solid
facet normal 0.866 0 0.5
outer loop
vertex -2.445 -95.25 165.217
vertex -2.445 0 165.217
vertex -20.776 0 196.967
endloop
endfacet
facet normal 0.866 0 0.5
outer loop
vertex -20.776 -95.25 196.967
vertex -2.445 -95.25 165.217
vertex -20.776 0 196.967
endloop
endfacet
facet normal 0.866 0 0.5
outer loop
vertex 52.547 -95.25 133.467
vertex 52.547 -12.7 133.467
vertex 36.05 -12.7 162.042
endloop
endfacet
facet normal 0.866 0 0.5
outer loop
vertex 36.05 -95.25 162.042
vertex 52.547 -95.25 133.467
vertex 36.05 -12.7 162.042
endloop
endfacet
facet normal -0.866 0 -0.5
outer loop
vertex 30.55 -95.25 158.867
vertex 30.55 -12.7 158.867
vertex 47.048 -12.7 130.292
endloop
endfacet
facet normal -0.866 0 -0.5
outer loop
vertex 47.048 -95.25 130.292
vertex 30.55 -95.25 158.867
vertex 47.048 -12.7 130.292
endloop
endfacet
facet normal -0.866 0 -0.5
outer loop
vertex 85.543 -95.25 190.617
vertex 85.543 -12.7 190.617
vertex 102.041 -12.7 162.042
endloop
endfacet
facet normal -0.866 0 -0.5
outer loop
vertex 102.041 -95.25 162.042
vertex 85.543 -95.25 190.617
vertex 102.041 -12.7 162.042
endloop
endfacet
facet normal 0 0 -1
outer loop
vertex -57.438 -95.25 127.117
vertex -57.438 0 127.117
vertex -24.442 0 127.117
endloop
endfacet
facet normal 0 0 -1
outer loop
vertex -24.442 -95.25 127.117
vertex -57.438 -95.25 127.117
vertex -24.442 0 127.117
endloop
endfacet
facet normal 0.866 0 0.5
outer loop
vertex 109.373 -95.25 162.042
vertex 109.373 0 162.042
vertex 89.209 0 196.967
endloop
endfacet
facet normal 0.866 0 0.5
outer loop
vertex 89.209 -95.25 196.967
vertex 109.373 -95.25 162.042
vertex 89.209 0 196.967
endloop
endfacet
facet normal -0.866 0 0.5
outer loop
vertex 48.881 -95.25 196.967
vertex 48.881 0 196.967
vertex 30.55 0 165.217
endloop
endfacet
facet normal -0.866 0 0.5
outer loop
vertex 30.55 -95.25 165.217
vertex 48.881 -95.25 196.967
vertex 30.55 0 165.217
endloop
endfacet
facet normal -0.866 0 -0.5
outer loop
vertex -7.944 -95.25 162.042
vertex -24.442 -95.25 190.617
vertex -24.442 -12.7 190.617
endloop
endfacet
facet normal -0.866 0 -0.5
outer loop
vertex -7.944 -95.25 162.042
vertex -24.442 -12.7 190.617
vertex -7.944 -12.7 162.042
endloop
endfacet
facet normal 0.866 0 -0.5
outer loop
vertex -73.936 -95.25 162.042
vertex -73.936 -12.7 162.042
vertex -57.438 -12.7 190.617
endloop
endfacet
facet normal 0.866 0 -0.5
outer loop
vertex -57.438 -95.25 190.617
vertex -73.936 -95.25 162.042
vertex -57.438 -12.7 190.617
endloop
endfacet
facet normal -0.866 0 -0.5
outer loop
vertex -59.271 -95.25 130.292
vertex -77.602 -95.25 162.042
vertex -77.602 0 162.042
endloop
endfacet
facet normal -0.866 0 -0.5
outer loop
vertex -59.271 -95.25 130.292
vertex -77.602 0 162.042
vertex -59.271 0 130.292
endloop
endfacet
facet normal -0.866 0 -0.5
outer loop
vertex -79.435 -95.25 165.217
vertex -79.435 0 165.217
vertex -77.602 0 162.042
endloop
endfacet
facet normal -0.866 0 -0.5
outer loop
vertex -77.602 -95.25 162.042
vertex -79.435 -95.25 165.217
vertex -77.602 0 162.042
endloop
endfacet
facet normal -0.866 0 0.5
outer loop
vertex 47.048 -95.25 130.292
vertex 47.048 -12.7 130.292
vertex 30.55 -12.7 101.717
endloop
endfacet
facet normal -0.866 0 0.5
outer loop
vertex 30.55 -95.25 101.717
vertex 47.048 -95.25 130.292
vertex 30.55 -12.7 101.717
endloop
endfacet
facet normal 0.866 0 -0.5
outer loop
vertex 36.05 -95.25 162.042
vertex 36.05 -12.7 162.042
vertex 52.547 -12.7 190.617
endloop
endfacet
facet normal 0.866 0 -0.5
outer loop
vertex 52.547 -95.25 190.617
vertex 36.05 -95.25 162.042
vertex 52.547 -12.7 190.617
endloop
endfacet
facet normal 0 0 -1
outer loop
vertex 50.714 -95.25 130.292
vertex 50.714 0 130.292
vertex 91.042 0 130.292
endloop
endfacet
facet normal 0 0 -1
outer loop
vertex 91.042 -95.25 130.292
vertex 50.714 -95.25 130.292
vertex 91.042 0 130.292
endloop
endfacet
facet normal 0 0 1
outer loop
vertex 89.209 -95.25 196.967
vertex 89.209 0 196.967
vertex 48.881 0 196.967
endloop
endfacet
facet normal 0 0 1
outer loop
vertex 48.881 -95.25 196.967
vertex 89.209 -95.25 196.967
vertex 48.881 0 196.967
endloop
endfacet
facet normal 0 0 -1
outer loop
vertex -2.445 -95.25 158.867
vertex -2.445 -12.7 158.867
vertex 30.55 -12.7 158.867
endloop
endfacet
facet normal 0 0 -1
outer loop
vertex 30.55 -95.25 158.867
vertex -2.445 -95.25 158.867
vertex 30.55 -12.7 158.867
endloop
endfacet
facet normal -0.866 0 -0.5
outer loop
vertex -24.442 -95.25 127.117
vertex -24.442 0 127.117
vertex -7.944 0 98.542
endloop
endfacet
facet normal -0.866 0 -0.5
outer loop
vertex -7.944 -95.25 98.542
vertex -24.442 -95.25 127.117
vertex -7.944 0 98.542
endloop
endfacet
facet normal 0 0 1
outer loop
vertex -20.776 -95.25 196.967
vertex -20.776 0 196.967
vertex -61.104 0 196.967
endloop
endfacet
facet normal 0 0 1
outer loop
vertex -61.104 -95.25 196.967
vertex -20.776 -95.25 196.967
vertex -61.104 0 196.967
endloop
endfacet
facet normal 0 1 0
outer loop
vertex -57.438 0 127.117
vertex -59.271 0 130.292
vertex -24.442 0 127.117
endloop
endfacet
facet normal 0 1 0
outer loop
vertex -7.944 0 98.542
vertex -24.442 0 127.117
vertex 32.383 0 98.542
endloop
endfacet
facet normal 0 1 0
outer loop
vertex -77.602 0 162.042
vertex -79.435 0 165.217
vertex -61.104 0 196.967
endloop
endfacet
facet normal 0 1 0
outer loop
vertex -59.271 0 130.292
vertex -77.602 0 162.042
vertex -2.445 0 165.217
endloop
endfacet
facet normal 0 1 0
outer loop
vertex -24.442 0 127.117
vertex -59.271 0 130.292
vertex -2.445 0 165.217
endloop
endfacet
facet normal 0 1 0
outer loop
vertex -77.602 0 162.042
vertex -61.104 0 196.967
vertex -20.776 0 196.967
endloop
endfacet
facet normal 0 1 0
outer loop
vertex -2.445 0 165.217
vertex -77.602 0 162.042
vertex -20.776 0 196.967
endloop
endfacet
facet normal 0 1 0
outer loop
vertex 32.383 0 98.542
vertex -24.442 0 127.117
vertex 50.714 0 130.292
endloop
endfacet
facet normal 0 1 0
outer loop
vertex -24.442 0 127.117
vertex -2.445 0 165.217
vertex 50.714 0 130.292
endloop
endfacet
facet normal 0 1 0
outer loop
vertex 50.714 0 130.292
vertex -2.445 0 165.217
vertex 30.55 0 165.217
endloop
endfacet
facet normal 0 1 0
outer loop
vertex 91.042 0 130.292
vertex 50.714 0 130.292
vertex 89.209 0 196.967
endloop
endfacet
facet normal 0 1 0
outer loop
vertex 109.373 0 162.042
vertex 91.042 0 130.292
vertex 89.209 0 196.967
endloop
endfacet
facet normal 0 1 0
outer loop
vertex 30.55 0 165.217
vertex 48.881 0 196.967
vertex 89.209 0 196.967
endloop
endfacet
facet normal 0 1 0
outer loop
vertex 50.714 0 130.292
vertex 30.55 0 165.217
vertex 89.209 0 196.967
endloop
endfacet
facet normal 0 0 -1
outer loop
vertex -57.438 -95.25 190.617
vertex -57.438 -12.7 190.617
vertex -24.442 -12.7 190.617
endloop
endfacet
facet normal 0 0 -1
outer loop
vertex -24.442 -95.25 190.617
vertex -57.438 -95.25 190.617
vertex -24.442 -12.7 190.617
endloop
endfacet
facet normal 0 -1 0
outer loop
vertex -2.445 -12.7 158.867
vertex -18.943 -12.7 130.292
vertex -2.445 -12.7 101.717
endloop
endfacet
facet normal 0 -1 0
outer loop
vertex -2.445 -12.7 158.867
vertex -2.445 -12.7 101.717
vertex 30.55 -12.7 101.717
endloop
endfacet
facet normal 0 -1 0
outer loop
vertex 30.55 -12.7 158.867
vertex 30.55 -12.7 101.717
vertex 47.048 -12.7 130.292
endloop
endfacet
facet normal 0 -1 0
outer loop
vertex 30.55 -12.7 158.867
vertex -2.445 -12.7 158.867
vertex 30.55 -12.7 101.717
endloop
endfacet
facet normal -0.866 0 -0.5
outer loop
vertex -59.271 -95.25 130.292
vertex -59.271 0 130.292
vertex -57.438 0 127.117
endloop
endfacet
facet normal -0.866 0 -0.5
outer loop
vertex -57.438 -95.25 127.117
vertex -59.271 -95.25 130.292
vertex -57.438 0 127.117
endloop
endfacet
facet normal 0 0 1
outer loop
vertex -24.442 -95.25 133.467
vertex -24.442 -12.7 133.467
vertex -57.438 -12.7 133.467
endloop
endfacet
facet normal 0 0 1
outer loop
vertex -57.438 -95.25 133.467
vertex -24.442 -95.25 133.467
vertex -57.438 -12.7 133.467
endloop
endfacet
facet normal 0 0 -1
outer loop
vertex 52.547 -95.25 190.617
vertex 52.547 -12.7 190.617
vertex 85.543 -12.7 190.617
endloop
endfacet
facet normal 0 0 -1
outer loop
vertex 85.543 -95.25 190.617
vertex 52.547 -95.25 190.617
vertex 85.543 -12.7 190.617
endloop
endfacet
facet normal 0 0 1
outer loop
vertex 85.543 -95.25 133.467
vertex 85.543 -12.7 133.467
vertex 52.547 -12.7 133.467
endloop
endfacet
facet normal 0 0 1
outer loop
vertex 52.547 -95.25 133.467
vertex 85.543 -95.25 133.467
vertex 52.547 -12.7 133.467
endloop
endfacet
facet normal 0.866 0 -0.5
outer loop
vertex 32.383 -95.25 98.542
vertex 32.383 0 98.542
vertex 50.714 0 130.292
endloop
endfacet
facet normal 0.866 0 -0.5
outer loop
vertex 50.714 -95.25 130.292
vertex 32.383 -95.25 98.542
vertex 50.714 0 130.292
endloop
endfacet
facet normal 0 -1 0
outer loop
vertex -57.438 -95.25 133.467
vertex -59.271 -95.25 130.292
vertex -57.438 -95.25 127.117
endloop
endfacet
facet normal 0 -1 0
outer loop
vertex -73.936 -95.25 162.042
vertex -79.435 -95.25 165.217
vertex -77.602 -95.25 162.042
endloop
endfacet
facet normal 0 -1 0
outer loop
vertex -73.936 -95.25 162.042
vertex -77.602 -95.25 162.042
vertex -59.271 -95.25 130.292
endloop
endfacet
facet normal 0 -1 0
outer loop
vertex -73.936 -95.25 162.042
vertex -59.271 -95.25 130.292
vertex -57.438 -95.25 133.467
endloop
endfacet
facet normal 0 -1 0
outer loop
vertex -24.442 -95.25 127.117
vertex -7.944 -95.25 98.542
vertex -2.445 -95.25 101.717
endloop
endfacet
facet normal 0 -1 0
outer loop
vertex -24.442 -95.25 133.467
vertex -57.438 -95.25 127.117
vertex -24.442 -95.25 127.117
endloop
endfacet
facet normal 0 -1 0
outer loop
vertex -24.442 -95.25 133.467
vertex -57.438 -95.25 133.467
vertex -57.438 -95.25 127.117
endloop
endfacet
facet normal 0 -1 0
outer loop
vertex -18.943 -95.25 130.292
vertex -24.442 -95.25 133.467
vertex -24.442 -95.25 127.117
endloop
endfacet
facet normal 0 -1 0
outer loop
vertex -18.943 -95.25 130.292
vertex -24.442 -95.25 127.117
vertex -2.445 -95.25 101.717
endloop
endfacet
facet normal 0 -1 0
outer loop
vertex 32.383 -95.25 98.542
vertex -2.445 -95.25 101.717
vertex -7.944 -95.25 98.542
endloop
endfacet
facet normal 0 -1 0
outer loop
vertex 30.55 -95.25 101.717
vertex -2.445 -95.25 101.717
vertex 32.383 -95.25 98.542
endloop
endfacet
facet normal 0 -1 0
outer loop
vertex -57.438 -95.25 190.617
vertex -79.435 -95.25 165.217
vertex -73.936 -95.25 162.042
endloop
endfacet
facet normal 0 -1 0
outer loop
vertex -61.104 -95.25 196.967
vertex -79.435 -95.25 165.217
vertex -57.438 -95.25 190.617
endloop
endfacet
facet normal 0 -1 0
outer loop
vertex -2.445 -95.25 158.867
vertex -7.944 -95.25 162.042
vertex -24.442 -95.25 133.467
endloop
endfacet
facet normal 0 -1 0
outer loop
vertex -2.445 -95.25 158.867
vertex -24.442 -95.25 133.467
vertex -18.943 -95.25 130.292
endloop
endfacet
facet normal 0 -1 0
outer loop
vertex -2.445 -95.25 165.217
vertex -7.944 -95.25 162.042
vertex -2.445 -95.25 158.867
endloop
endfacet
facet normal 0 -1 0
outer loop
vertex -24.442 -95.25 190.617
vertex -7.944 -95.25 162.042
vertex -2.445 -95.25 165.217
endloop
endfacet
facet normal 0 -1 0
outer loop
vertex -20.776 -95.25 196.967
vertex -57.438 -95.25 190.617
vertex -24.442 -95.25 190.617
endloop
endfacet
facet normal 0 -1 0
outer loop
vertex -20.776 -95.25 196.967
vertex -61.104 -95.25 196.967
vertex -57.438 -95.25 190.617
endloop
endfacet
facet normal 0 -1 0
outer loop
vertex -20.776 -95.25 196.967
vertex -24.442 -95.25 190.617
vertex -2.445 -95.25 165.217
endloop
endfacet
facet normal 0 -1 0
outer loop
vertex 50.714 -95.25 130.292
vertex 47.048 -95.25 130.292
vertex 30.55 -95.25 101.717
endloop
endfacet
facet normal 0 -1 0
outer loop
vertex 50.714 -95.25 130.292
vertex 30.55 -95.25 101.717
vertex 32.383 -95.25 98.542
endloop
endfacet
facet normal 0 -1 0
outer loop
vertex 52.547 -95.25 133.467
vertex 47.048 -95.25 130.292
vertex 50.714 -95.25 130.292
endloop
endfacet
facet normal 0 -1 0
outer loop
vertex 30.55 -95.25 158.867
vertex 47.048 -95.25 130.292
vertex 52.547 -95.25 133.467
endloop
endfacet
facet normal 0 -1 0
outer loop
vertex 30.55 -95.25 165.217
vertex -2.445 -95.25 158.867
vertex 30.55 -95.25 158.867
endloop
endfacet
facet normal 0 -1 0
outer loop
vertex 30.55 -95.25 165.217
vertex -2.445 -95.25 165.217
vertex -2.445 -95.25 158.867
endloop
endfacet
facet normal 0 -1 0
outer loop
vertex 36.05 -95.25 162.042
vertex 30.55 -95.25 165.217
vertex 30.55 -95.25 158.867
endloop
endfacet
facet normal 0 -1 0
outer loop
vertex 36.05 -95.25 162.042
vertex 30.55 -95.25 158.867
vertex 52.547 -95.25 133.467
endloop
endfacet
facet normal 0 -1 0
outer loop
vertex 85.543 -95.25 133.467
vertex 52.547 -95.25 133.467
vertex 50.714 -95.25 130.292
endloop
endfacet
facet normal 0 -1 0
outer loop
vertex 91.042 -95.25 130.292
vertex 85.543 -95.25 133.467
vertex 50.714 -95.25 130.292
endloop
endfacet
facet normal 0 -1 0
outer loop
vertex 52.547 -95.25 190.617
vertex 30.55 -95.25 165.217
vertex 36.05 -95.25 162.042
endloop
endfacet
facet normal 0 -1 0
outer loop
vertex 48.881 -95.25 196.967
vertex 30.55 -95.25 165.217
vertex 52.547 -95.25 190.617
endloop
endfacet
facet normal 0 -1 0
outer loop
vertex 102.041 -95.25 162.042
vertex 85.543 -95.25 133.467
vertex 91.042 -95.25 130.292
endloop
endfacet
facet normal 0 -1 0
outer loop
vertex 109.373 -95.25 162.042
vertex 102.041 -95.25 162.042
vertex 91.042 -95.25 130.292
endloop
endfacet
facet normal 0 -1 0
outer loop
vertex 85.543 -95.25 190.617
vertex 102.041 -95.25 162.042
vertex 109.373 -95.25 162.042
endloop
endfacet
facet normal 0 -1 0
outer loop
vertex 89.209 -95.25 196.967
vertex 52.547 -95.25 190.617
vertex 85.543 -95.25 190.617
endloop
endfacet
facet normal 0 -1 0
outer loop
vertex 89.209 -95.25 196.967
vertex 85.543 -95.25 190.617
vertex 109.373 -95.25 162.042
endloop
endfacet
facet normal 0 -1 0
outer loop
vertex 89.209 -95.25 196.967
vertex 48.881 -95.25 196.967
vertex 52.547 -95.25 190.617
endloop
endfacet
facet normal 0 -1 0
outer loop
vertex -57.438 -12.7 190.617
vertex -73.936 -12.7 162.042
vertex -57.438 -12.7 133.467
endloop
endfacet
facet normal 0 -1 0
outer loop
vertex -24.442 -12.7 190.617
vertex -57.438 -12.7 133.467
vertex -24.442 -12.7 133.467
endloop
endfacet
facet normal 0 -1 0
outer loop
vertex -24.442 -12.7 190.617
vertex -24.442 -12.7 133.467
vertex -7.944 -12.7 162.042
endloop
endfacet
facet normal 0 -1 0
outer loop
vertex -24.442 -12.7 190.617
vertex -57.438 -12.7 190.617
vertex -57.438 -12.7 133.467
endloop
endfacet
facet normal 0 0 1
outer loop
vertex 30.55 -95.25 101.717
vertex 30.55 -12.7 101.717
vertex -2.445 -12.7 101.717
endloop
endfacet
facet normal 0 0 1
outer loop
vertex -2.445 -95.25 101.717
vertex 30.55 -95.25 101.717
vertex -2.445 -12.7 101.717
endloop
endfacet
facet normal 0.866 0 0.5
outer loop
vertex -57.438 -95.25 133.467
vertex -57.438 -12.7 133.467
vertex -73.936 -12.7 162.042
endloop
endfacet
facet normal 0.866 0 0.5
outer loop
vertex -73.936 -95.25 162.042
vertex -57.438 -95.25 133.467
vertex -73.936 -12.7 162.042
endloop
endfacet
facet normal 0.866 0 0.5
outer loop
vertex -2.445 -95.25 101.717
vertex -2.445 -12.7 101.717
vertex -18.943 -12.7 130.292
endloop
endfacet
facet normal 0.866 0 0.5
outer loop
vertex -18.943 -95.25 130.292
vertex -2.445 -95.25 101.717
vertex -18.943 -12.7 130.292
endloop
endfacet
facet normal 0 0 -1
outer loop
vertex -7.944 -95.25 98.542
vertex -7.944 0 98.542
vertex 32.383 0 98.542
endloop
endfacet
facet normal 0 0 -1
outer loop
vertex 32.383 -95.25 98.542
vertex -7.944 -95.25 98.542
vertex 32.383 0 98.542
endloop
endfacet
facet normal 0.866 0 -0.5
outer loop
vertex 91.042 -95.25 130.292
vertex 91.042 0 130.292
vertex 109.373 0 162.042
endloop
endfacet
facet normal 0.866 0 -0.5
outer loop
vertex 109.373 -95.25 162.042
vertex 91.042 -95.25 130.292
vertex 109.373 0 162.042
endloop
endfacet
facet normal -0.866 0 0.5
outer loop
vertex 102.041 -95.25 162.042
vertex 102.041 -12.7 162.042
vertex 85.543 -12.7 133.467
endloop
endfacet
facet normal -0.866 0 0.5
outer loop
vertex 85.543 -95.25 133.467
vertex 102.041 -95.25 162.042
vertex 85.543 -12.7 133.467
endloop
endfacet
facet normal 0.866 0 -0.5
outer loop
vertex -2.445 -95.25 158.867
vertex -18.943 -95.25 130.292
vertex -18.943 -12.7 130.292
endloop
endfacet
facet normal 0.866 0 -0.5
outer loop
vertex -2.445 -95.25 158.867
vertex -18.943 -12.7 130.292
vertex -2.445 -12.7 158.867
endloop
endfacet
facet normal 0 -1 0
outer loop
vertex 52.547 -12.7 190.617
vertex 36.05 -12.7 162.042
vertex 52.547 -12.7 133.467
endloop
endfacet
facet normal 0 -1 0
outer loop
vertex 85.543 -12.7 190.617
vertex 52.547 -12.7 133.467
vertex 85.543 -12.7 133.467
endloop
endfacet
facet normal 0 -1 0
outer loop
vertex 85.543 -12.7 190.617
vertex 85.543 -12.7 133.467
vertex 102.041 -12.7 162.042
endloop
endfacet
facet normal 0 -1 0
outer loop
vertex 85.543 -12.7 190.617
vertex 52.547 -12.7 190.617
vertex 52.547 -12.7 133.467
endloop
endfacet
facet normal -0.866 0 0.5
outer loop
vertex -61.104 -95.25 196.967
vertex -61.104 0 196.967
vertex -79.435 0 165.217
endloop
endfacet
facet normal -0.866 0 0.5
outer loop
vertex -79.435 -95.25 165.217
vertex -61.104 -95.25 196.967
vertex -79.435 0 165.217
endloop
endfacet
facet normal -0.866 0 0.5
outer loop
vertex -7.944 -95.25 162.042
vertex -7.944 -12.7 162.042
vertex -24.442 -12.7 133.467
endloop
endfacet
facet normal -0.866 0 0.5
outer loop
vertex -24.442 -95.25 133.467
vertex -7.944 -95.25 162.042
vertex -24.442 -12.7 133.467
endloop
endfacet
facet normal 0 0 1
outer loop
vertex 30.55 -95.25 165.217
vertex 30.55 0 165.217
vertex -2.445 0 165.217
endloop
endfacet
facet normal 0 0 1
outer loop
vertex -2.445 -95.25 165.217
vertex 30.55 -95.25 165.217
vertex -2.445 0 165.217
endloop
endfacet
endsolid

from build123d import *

# Parameters (mm, degrees)
F1_DEPTH = 12.7
F2_DEPTH = 95.25


# Not quite as in the source:
# - a feature names something its author has since deleted; it is built from what else it names


with BuildPart() as f1:
    # F0 (on Front) → F1 (new body)
    with BuildSketch(Plane.XZ):
        Polygon((-22.6091385288, 130.2924993012), (-4.278267482, 98.5424993012), (32.3834746115, 98.5424993012), (50.7143456583, 130.2924993012), (32.3834746116, 162.0424993012), (-4.278267482, 162.0424993012), align=None)
        Polygon((-2.4451803773, 101.7174993012), (-18.9429643194, 130.2924993012), (-2.4451803773, 158.8674993012), (30.5503875069, 158.8674993012), (47.048171449, 130.2924993012), (30.5503875069, 101.7174993012), align=None, mode=Mode.SUBTRACT)
        Polygon((-27.4963065598, 130.2924993012), (-22.6091385288, 130.2924993012), (-4.278267482, 162.0424993012), (-22.6091385288, 193.7924993012), (-59.2708806223, 193.7924993012), (-77.6017516691, 162.0424993012), (-59.2708806223, 130.2924993012), align=None)
        Polygon((-57.4377935176, 133.4674993012), (-73.9355774597, 162.0424993012), (-57.4377935176, 190.6174993012), (-24.4422256334, 190.6174993012), (-7.9444416913, 162.0424993012), (-24.4422256334, 133.4674993012), align=None, mode=Mode.SUBTRACT)
        Polygon((32.3834746116, 162.0424993012), (50.7143456583, 130.2924993012), (87.3760877519, 130.2924993012), (105.7069587986, 162.0424993012), (87.3760877519, 193.7924993012), (50.7143456583, 193.7924993012), align=None)
        Polygon((52.547432763, 133.4674993012), (36.0496488209, 162.0424993012), (52.547432763, 190.6174993012), (85.5430006472, 190.6174993012), (102.0407845893, 162.0424993012), (85.5430006472, 133.4674993012), align=None, mode=Mode.SUBTRACT)
        Polygon((-57.4377935176, 190.6174993012), (-73.9355774597, 162.0424993012), (-57.4377935176, 133.4674993012), (-24.4422256334, 133.4674993012), (-7.9444416913, 162.0424993012), (-24.4422256334, 190.6174993012), align=None)
        Polygon((52.547432763, 190.6174993012), (36.0496488209, 162.0424993012), (52.547432763, 133.4674993012), (85.5430006472, 133.4674993012), (102.0407845893, 162.0424993012), (85.5430006472, 190.6174993012), align=None)
        Polygon((-2.4451803773, 158.8674993012), (-18.9429643194, 130.2924993012), (-2.4451803773, 101.7174993012), (30.5503875069, 101.7174993012), (47.048171449, 130.2924993012), (30.5503875069, 158.8674993012), align=None)
    extrude(amount=F1_DEPTH)

    # F0 (on Front) → F2 (join)
    with BuildSketch(Plane.XZ):
        Polygon((-22.6091385288, 130.2924993012), (-4.278267482, 98.5424993012), (32.3834746115, 98.5424993012), (50.7143456583, 130.2924993012), (32.3834746116, 162.0424993012), (-4.278267482, 162.0424993012), align=None)
        Polygon((-2.4451803773, 101.7174993012), (-18.9429643194, 130.2924993012), (-2.4451803773, 158.8674993012), (30.5503875069, 158.8674993012), (47.048171449, 130.2924993012), (30.5503875069, 101.7174993012), align=None, mode=Mode.SUBTRACT)
        Polygon((32.3834746116, 162.0424993012), (50.7143456583, 130.2924993012), (87.3760877519, 130.2924993012), (105.7069587986, 162.0424993012), (87.3760877519, 193.7924993012), (50.7143456583, 193.7924993012), align=None)
        Polygon((52.547432763, 133.4674993012), (36.0496488209, 162.0424993012), (52.547432763, 190.6174993012), (85.5430006472, 190.6174993012), (102.0407845893, 162.0424993012), (85.5430006472, 133.4674993012), align=None, mode=Mode.SUBTRACT)
        Polygon((-27.4963065598, 130.2924993012), (-22.6091385288, 130.2924993012), (-4.278267482, 162.0424993012), (-22.6091385288, 193.7924993012), (-59.2708806223, 193.7924993012), (-77.6017516691, 162.0424993012), (-59.2708806223, 130.2924993012), align=None)
        Polygon((-57.4377935176, 133.4674993012), (-73.9355774597, 162.0424993012), (-57.4377935176, 190.6174993012), (-24.4422256334, 190.6174993012), (-7.9444416913, 162.0424993012), (-24.4422256334, 133.4674993012), align=None, mode=Mode.SUBTRACT)
        Polygon((-22.6091385288, 193.7924993012), (-4.278267482, 162.0424993012), (32.3834746116, 162.0424993012), (50.7143456583, 193.7924993012), (87.3760877519, 193.7924993012), (105.7069587986, 162.0424993012), (87.3760877519, 130.2924993012), (91.0422619612, 130.2924993012), (109.373133008, 162.0424993012), (89.2091748565, 196.9674993012), (48.8812585537, 196.9674993012), (30.5503875069, 165.2174993012), (-2.4451803773, 165.2174993012), (-20.7760514241, 196.9674993012), (-61.103967727, 196.9674993012), (-79.4348387737, 165.2174993012), (-77.6017516691, 162.0424993012), (-59.2708806223, 193.7924993012), align=None)
        Polygon((-7.9444416913, 98.5424993012), (-4.278267482, 98.5424993012), (-22.6091385288, 130.2924993012), (-27.4963065598, 130.2924993012), (-59.2708806223, 130.2924993012), (-57.4377935176, 127.1174993012), (-24.4422256334, 127.1174993012), align=None)
    extrude(amount=F2_DEPTH)


solid = f1.part
